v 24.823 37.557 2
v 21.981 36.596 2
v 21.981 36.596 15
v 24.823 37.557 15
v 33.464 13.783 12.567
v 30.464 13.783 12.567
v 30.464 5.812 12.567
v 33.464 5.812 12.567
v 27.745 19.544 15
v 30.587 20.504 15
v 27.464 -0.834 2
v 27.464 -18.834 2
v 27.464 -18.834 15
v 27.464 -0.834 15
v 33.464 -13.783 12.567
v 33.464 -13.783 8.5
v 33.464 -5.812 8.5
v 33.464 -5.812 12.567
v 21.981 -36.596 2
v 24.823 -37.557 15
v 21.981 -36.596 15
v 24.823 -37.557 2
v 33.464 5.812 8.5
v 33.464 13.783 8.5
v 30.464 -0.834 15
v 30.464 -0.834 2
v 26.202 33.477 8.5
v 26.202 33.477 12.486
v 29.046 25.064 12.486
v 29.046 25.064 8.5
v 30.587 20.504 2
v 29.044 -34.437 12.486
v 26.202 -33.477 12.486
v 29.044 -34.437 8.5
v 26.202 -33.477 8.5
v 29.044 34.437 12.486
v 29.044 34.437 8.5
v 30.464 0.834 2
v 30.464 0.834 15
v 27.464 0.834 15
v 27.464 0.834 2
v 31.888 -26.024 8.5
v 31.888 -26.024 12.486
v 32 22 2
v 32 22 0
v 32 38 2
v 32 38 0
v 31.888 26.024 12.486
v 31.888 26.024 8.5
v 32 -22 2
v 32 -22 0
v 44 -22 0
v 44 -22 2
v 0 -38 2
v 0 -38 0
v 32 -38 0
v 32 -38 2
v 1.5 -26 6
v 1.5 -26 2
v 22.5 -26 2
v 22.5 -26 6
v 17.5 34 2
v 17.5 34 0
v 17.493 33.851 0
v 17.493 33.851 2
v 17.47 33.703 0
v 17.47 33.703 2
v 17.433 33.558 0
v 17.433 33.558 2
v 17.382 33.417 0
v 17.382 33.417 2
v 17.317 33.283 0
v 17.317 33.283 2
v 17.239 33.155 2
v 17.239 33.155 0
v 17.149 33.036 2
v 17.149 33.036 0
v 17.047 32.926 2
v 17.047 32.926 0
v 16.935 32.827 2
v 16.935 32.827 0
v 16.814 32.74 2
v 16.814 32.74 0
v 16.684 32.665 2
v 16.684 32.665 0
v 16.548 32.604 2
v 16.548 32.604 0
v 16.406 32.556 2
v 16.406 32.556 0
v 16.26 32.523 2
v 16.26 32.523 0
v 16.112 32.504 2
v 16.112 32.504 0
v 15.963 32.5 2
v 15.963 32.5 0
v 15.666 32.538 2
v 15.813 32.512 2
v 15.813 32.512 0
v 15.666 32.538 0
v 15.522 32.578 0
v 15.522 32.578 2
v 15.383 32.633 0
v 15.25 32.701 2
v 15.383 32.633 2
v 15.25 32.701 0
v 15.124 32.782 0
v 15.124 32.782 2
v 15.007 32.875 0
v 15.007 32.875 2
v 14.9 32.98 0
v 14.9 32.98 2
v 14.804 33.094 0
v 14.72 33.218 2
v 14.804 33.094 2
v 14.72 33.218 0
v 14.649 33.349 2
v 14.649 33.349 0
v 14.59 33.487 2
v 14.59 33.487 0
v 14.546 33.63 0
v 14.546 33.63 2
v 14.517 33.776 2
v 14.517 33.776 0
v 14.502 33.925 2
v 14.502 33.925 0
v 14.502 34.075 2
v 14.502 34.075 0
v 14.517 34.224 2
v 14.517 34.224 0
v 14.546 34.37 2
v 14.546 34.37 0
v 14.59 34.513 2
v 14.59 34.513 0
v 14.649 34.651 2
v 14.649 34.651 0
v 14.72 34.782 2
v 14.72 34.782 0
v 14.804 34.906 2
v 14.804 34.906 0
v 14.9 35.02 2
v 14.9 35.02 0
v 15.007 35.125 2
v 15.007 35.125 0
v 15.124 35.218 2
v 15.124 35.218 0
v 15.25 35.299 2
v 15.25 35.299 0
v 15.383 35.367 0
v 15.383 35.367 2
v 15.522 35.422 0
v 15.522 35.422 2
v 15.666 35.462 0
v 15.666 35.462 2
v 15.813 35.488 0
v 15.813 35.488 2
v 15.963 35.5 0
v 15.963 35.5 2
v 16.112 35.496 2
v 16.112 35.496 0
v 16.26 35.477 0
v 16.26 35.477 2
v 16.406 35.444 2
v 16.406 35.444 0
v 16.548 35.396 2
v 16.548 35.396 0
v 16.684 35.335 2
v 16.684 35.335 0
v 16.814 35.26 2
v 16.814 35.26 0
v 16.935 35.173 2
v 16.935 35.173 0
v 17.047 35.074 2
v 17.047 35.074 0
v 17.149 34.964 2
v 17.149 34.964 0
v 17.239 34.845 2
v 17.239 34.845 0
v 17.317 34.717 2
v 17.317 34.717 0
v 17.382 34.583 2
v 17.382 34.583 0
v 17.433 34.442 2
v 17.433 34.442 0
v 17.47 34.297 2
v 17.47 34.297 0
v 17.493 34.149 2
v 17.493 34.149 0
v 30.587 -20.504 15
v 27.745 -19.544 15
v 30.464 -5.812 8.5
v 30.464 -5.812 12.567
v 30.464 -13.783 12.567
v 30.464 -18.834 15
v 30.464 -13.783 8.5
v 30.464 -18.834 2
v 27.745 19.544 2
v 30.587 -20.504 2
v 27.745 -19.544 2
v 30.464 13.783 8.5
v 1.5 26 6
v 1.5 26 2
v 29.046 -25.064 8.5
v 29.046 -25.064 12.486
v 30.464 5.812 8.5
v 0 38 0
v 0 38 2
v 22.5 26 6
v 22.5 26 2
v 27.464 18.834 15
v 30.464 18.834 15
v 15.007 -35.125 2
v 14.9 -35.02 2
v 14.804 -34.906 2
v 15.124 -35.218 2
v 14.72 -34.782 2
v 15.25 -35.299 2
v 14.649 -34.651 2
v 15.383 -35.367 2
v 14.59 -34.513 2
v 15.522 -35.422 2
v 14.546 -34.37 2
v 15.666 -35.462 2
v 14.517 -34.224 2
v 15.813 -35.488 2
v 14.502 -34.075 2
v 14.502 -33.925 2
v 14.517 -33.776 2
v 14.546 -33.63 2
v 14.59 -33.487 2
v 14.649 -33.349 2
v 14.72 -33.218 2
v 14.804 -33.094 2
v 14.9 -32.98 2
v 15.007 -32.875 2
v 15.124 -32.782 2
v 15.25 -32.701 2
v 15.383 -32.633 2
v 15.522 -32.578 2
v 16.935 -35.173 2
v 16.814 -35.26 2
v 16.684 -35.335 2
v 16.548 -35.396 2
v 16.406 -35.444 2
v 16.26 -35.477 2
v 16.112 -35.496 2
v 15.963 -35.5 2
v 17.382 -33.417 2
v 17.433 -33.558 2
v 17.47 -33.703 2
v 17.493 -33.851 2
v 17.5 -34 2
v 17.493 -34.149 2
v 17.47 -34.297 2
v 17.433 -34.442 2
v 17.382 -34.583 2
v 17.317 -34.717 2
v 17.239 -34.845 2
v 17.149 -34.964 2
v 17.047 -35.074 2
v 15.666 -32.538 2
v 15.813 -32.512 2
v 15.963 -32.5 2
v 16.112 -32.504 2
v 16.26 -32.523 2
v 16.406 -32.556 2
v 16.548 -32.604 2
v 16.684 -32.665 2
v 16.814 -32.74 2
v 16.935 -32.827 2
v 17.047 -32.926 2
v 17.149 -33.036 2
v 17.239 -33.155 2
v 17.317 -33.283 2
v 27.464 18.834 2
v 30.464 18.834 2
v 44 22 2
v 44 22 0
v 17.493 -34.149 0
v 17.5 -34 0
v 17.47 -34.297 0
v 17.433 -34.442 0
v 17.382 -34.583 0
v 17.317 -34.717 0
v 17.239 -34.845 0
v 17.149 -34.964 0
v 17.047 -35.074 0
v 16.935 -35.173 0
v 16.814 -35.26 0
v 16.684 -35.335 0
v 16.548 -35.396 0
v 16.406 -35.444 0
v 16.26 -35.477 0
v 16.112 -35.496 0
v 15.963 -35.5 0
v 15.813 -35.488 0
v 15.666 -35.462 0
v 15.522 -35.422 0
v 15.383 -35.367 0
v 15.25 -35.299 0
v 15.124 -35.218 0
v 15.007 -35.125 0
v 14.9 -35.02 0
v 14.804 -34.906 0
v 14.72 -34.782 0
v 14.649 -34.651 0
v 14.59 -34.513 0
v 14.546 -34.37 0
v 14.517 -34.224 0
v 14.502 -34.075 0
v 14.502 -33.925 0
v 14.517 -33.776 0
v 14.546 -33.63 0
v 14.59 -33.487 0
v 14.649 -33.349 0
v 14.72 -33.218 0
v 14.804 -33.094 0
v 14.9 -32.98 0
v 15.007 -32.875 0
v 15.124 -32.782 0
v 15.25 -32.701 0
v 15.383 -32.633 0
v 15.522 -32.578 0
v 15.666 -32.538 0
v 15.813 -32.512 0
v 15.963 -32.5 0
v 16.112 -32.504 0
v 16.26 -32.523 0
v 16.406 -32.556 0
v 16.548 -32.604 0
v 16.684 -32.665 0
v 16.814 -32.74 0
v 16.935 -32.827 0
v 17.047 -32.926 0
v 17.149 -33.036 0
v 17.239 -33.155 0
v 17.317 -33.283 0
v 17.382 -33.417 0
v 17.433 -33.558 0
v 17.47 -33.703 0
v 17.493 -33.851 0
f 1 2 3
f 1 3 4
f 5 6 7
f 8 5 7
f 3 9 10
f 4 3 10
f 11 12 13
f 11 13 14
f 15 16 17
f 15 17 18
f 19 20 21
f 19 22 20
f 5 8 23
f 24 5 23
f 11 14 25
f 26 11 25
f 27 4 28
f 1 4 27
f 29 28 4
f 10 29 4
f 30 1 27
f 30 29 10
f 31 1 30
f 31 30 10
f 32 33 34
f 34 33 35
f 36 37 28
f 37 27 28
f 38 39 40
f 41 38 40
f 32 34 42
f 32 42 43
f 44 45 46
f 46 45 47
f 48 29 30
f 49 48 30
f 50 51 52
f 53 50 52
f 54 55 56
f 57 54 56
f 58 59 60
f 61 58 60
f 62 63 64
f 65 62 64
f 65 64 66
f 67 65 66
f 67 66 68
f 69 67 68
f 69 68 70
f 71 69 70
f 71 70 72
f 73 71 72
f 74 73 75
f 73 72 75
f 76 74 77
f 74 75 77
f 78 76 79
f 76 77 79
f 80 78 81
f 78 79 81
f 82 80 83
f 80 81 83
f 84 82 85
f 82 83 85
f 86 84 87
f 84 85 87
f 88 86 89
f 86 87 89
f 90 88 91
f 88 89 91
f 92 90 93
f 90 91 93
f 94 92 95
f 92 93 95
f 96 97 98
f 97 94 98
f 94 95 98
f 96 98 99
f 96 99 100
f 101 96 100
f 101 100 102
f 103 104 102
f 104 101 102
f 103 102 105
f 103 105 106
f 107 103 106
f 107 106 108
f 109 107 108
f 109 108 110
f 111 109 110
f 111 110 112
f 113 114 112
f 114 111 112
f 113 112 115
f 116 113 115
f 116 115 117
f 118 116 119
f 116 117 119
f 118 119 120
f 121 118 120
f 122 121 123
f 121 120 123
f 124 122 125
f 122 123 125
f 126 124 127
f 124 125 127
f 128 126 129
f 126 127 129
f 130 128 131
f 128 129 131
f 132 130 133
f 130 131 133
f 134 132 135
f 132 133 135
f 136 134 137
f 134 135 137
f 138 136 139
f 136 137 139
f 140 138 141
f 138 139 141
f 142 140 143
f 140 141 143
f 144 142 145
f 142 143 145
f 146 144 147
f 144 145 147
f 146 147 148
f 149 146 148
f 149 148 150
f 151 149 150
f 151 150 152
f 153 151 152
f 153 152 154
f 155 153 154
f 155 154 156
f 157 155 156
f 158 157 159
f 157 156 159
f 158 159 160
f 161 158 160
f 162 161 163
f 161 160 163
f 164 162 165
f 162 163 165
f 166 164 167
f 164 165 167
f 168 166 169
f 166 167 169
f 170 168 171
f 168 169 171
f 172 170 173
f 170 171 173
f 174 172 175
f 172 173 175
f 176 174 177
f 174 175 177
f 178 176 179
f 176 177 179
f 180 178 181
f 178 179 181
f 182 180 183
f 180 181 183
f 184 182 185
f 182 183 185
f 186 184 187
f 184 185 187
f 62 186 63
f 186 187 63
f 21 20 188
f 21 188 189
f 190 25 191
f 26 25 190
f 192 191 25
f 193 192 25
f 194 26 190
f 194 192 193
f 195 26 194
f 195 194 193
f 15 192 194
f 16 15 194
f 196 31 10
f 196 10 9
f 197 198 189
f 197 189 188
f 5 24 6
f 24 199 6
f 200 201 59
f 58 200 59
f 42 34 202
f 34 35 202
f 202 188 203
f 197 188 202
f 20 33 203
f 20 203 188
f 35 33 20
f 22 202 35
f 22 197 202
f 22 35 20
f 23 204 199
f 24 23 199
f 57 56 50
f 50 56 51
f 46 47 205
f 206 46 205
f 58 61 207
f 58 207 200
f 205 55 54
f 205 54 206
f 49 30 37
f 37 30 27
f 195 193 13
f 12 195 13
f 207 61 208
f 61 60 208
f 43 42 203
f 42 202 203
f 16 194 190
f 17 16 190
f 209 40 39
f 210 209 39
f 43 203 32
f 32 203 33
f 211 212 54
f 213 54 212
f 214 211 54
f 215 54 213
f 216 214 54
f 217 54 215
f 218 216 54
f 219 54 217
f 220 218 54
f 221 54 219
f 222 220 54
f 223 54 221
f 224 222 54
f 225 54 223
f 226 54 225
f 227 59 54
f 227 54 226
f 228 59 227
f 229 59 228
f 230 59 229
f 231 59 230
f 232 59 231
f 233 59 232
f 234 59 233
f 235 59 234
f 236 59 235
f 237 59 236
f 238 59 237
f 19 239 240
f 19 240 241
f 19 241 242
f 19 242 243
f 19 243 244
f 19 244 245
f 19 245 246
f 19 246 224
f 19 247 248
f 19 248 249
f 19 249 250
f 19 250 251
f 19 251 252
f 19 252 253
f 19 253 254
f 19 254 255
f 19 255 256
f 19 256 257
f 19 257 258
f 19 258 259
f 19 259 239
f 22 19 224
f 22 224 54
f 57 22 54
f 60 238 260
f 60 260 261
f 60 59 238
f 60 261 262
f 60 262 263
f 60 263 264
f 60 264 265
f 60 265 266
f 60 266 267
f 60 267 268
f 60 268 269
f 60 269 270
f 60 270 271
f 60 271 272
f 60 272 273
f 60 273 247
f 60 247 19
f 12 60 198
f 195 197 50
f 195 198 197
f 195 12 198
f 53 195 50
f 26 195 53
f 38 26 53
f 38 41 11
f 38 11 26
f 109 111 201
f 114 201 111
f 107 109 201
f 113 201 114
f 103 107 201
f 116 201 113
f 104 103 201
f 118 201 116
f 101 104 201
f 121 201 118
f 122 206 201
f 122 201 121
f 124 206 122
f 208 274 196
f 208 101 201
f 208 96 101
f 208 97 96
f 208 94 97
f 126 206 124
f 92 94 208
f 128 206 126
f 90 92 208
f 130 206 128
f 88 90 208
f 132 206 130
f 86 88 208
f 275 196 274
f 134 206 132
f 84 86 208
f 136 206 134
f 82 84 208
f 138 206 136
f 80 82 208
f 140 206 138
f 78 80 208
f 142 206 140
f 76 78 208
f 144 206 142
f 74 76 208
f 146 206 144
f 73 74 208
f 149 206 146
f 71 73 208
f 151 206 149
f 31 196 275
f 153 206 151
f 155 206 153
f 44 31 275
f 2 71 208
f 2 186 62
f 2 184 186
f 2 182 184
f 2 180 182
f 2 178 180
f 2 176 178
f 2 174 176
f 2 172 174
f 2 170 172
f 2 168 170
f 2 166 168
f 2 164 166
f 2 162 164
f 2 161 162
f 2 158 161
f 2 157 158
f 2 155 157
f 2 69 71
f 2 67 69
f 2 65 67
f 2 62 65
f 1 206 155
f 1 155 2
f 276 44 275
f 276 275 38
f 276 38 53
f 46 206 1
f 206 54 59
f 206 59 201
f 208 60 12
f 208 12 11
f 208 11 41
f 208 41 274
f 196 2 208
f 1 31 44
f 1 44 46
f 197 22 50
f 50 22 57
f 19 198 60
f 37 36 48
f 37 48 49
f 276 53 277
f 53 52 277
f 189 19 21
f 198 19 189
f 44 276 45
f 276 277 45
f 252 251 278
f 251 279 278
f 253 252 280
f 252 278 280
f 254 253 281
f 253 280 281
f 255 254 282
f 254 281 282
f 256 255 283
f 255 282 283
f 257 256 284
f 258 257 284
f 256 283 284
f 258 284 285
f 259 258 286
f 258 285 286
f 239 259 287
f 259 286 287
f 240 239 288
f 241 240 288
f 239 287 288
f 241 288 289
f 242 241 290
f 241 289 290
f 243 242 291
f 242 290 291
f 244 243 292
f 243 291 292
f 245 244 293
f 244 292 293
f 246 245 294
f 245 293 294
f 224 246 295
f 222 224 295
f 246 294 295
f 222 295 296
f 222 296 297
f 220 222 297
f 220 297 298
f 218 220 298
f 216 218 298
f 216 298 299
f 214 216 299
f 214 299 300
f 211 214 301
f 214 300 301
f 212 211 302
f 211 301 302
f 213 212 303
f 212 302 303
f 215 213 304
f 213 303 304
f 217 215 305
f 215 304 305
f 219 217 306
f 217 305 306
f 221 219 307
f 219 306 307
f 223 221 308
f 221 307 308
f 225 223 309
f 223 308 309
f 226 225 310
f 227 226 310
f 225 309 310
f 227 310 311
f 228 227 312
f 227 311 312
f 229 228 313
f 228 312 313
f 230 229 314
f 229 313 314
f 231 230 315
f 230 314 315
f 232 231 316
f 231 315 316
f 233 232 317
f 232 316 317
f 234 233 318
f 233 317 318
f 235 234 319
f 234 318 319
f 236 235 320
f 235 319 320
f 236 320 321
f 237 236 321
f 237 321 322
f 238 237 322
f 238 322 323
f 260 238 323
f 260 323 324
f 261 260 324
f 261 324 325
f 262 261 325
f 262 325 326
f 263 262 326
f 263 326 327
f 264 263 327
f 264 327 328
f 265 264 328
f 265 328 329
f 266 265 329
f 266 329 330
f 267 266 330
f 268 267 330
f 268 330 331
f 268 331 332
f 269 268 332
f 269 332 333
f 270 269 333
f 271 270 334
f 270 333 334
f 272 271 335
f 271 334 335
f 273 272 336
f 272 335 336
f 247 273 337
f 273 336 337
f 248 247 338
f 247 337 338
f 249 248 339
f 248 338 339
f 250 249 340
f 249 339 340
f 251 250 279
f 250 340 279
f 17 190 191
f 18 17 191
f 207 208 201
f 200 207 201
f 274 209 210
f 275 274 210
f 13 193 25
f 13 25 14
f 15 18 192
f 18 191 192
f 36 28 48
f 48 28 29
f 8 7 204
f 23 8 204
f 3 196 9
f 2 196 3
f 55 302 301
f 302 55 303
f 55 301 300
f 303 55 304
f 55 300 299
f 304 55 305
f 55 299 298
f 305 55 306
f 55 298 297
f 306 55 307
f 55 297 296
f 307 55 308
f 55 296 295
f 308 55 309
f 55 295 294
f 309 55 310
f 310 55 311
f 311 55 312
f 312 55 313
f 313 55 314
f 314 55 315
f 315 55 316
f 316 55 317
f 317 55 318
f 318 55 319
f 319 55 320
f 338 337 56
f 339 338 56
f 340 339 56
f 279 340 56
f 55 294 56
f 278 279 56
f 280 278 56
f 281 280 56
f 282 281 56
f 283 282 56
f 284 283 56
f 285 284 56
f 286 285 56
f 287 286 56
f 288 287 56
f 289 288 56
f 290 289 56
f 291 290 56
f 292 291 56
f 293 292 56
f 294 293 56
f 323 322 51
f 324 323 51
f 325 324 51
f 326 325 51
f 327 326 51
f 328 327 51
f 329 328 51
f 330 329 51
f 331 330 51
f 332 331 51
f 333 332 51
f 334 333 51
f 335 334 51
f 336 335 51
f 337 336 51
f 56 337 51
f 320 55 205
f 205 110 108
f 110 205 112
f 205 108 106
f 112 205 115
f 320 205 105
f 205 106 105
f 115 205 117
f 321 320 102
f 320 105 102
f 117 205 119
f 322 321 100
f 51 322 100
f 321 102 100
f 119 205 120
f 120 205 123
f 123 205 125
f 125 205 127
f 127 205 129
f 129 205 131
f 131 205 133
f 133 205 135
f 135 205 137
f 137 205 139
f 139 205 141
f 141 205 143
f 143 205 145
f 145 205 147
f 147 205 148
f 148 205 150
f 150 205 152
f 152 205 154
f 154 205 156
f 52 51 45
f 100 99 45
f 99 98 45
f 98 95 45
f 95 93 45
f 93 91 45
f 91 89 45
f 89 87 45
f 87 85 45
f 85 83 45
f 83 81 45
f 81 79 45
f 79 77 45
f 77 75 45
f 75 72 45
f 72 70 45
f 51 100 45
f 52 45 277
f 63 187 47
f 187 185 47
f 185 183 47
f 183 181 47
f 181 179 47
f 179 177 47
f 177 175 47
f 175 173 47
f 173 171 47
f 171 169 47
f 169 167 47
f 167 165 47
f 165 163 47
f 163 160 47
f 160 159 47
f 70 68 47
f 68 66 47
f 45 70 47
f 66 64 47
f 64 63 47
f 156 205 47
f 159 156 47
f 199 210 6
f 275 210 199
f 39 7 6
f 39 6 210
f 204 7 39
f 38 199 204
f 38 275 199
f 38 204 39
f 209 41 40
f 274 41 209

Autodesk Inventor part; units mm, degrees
ref_plane "YZ Plane" through (0, 0, 0) normal (1, 0, 0) x (0, 1, 0)
ref_plane "XZ Plane" through (0, 0, 0) normal (0, 1, 0) x (-1, 0, 0)
ref_plane "XY Plane" through (0, 0, 0) normal (0, 0, 1) x (1, 0, 0)
sketch "Szkic1" plane through (0, 0, 0) normal (0, 0, 1) x (1, 0, 0)
  line L0 (0, -7.6) -> (0, 45.6) projected
  line L1 (-8.8, 0) -> (52.8, 0) projected
  line L2 (0, 0) -> (32, 0)
  line L3 (32, 0) -> (32, 38)
  line L4 (32, 38) -> (0, 38)
  line L5 (0, 38) -> (0, 0)
  circle A0 centre (16, 34) radius 1.5
  line L6 (32, 0) -> (44, 0)
  line L7 (44, 0) -> (44, 22)
  line L8 (44, 22) -> (32, 22)
  line L9 (32, 22) -> (32, 0)
  point P0 (0, 38)
  point P1 (32, 0)
  dimension "d0" = 32
  dimension "d1" = 38
  dimension "d2" = 3
  dimension "d3" = 4
  dimension "d4" = 16
  dimension "d18" = 12
  dimension "d19" = 22
extrude "Wyciągnięcie proste1" add sketch "Szkic1" along normal blind 2
sketch "Szkic2" plane through (0, 0, 2) normal (0, 0, 1) x (1, 0, 0)
  line L0 (0, 38) -> (0, 0) projected
  line L1 (0, 0) -> (44, 0) projected
  line L2 (32, 22) -> (32, 38) projected
  line L3 (32, 38) -> (0, 38) projected
  circle A0 centre (16, 34) radius 1.5 projected
  line L4 (0, 0) -> (44, 0) projected
  line L5 (1.5, 0) -> (22.5, 0)
  line L6 (22.5, 0) -> (22.5, 26)
  line L7 (22.5, 26) -> (1.5, 26)
  line L8 (1.5, 26) -> (1.5, 0)
  line L9 (44, 0) -> (44, 22) projected
  line L10 (44, 22) -> (32, 22) projected
  point P0 (32, 0)
  dimension "d7" = 26
  dimension "d8" = 21
  dimension "d9" = 1.5
extrude "Wyciągnięcie proste2" add sketch "Szkic2" along normal blind 4 contours L8 L7 L6 L1
sketch "Szkic3" plane through (0, 0, 2) normal (0, 0, 1) x (1, 0, 0)
  line L0 (27.4645, 18.8335) -> (30.4645, 18.8335)
  line L1 (30.4645, 18.8335) -> (30.4645, 0.8335)
  line L2 (30.4645, 0.8335) -> (27.4645, 0.8335)
  line L3 (27.4645, 0.8335) -> (27.4645, 18.8335)
  line L4 (32, 22) -> (32, 38) projected
  line L5 (21.9813, 36.596) -> (24.8234, 37.5566)
  line L6 (24.8234, 37.5566) -> (30.5867, 20.5042)
  line L7 (30.5867, 20.5042) -> (27.7447, 19.5436)
  line L8 (27.7447, 19.5436) -> (21.9813, 36.596)
  point P0 (0, 0)
  point P1 (32, 0)
  point P2 (26, 22.676)
  point P3 (26, 4.676)
  dimension "d14" = 18
  dimension "d15" = 3
  dimension "d20" = 18
  dimension "d21" = 3
extrude "Wyciągnięcie proste3" add sketch "Szkic3" along normal blind 13
sketch "Szkic4" plane through (30.4645, 0.8335, 2) normal (1, 0, 0) x (0, 0, -1)
  line L0 (0, 18) -> (0, 0) projected
  line L1 (0, 18) -> (-13, 18) projected
  line L2 (-13, 0) -> (-13, 18) projected
  line L3 (0, 0) -> (-13, 0) projected
  line L4 (-10.5669, 4.9788) -> (-6.5, 4.9788)
  line L5 (-6.5, 4.9788) -> (-6.5, 12.9492)
  line L6 (-6.5, 12.9492) -> (-10.5669, 12.9492)
  line L7 (-10.5669, 12.9492) -> (-10.5669, 4.9788)
  point P0 (2, -0.8335)
extrude "Wyciągnięcie proste4" add sketch "Szkic4" along normal blind 3 contours L7 L6 L5 L4
sketch "Szkic5" plane through (24.8234, 37.5566, 15) normal (0.9473547, 0.320186, 0) x (0, 0, -1)
  line L0 (13, 0) -> (13, -18) projected
  line L1 (13, 0) -> (0, 0) projected
  line L2 (0, -18) -> (0, 0) projected
  line L3 (13, -18) -> (0, -18) projected
  line L4 (2.5137, -13.1873) -> (6.5, -13.1873)
  line L5 (6.5, -13.1873) -> (6.5, -4.3066)
  line L6 (6.5, -4.3066) -> (2.5137, -4.3066)
  line L7 (2.5137, -4.3066) -> (2.5137, -13.1873)
  point P0 (15, -27.6313)
extrude "Wyciągnięcie proste5" add sketch "Szkic5" along normal blind 3 contours L7 L6 L5 L4
mirror "Odbij2" about plane through (0, 0, 0) normal (0, 1, 0) of "Wyciągnięcie proste1", "Wyciągnięcie proste2", "Wyciągnięcie proste3", "Wyciągnięcie proste4", "Wyciągnięcie proste5"
properties part number "płytka_pcb" material "Tworzywo sztuczne ABS"
